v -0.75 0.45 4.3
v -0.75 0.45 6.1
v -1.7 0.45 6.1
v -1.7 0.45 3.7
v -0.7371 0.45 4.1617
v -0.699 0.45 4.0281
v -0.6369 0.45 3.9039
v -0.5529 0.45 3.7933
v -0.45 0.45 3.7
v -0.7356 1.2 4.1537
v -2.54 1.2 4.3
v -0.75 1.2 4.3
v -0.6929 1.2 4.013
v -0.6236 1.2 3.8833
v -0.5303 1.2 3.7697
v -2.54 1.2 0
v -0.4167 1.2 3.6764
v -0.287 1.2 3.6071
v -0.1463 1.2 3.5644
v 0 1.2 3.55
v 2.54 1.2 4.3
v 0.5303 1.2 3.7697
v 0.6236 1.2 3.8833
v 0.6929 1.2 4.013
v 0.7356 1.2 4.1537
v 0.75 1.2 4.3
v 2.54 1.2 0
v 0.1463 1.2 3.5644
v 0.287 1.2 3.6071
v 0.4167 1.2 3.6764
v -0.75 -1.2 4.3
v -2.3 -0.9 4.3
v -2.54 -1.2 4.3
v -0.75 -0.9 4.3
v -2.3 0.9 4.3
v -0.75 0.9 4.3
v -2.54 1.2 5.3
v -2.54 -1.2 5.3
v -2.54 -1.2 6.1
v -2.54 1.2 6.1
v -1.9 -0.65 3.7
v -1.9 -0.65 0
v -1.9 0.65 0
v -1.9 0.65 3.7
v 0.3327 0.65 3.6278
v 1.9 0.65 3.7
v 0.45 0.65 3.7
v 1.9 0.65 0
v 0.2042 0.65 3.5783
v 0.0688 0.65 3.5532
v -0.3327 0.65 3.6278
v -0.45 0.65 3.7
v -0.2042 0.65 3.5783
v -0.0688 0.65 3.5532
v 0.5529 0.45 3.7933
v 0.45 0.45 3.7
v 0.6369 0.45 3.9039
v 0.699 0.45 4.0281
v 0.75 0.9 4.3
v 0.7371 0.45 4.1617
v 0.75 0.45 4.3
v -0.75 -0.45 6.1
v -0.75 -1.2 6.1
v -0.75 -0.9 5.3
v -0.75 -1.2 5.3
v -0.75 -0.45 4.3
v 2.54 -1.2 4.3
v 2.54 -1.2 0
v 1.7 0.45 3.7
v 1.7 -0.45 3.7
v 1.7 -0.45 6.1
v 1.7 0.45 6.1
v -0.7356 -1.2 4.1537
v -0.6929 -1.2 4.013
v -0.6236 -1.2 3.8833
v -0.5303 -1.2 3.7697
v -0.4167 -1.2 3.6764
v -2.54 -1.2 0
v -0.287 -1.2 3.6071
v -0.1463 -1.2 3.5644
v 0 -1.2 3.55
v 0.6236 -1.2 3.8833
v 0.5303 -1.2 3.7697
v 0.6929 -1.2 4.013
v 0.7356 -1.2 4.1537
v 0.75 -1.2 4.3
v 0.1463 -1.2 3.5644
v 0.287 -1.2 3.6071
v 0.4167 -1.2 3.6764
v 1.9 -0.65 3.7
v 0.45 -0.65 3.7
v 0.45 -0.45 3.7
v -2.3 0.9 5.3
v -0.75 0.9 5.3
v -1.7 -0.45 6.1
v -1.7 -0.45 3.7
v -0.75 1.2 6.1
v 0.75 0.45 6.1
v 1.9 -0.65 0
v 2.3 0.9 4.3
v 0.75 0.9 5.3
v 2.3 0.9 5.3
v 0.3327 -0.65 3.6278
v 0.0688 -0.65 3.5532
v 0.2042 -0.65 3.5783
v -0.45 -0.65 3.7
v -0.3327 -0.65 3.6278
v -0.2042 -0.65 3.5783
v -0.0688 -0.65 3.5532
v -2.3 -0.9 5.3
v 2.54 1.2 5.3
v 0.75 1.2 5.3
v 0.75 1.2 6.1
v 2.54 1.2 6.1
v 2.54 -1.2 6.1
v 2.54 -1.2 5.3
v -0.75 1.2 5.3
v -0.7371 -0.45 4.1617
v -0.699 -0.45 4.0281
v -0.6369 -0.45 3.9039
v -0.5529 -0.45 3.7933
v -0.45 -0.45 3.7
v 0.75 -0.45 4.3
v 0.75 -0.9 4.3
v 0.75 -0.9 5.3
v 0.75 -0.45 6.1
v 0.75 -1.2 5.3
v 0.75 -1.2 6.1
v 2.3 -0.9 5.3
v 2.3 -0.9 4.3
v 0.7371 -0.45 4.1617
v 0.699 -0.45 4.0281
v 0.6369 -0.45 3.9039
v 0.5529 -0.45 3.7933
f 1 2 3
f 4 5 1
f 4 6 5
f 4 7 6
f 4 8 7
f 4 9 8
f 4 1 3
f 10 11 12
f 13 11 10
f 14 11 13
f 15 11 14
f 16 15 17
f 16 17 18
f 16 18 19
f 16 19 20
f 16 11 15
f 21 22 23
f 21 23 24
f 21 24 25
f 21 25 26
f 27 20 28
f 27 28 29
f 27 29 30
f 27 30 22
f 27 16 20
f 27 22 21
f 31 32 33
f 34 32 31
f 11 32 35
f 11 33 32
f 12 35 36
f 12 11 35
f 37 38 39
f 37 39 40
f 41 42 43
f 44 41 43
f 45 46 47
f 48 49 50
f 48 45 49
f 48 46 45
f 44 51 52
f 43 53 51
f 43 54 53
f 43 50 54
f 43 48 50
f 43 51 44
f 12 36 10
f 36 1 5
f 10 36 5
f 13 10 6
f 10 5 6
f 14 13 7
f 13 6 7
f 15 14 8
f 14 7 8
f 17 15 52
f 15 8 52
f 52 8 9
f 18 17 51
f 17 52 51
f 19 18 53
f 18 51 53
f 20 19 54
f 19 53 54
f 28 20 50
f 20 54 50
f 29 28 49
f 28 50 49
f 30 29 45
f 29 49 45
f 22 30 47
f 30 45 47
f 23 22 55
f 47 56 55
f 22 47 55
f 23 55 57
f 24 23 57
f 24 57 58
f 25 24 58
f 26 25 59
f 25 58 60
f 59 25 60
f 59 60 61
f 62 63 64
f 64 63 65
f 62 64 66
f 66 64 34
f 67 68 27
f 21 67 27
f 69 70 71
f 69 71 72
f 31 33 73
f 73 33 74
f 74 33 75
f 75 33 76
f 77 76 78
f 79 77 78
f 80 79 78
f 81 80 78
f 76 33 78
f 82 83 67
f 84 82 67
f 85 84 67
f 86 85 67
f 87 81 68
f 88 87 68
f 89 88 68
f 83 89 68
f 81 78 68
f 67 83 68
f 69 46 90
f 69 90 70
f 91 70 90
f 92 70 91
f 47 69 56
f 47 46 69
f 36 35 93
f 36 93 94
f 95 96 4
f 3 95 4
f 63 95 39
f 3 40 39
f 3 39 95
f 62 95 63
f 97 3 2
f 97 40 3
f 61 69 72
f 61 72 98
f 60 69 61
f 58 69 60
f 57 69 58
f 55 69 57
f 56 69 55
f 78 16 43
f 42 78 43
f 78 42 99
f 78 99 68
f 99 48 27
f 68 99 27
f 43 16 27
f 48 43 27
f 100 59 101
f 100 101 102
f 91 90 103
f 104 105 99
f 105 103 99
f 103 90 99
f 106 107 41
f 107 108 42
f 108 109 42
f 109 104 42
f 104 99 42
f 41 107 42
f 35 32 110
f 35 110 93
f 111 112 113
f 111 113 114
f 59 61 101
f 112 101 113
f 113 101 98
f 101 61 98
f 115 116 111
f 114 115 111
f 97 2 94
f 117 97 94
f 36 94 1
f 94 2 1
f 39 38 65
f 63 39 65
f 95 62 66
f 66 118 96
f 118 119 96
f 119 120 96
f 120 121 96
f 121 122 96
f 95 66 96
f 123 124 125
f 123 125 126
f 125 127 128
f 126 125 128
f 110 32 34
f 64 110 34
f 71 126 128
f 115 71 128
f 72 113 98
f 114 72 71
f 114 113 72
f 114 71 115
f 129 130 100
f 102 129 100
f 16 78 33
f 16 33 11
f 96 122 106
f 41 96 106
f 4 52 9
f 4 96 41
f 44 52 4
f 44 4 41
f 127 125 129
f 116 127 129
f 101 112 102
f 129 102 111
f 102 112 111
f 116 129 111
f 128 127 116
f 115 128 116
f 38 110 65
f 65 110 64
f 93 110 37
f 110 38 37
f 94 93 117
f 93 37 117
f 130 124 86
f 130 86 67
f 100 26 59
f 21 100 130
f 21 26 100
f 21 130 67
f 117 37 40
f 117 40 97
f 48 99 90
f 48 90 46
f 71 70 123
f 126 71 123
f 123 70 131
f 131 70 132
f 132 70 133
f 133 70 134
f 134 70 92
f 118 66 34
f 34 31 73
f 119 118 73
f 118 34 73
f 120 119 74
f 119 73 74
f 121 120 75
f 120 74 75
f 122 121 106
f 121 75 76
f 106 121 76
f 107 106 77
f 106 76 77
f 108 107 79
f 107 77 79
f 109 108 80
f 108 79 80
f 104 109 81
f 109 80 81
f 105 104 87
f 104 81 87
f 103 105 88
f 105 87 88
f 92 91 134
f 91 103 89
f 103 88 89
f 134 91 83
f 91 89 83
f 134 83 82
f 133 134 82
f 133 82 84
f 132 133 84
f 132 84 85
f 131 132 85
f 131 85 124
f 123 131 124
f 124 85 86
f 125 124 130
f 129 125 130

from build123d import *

# Parameters (mm, degrees)
SKETCH1_W             = 5.08
SKETCH1_H             = 2.4
EXTRUDE_223_DEPTH     = 4.3
SKETCH2_W             = 4.6
SKETCH2_H             = 1.8
EXTRUDE_304_DEPTH     = 1
SKETCH3_W             = 5.08
SKETCH3_H             = 2.4
EXTRUDE_441_DEPTH     = 0.8
SKETCH4_W             = 3.8
SKETCH4_H             = 1.3
CUT_EXTRUDE_523_DEPTH = 3.7
SKETCH5_W             = 3.4
SKETCH5_H             = 0.9
CUT_EXTRUDE_605_DEPTH = 5
CUT_EXTRUDE_729_DEPTH = 3


with BuildPart() as part:
    # Sketch1 → Extrude 223 (new body)
    with BuildSketch(Plane.XY):
        Rectangle(SKETCH1_W, SKETCH1_H)
    extrude(amount=EXTRUDE_223_DEPTH)

    # Sketch2 → Extrude 304 (add)
    with BuildSketch(Plane.XY.offset(4.3)):
        Rectangle(SKETCH2_W, SKETCH2_H)
    extrude(amount=EXTRUDE_304_DEPTH)

    # Sketch3 → Extrude 441 (add)
    with BuildSketch(Plane.XY.offset(5.3)):
        Rectangle(SKETCH3_W, SKETCH3_H)
    extrude(amount=EXTRUDE_441_DEPTH)

    # Sketch4 → Cut-Extrude 523 (cut)
    with BuildSketch(Plane(origin=(0, 0, 0), x_dir=(-1, 0, 0), z_dir=(0, 0, -1))):
        Rectangle(SKETCH4_W, SKETCH4_H)
    extrude(amount=-CUT_EXTRUDE_523_DEPTH, mode=Mode.SUBTRACT)

    # Sketch5 → Cut-Extrude 605 (cut)
    with BuildSketch(Plane(origin=(0, 0, 3.7), x_dir=(-1, 0, 0), z_dir=(0, 0, -1))):
        Rectangle(SKETCH5_W, SKETCH5_H)
    extrude(amount=-CUT_EXTRUDE_605_DEPTH, mode=Mode.SUBTRACT)

    # Sketch7 → Cut-Extrude 729 (cut)
    with BuildSketch(Plane.XZ.offset(1.2)):
        with BuildLine():
            Line((-0.75, 6.1), (-0.75, 4.3))
            ThreePointArc((-0.75, 4.3), (0, 3.55), (0.75, 4.3))
            Line((0.75, 4.3), (0.75, 6.1))
            Line((0.75, 6.1), (-0.75, 6.1))
        make_face()
    extrude(amount=-CUT_EXTRUDE_729_DEPTH, mode=Mode.SUBTRACT)


solid = part.part
